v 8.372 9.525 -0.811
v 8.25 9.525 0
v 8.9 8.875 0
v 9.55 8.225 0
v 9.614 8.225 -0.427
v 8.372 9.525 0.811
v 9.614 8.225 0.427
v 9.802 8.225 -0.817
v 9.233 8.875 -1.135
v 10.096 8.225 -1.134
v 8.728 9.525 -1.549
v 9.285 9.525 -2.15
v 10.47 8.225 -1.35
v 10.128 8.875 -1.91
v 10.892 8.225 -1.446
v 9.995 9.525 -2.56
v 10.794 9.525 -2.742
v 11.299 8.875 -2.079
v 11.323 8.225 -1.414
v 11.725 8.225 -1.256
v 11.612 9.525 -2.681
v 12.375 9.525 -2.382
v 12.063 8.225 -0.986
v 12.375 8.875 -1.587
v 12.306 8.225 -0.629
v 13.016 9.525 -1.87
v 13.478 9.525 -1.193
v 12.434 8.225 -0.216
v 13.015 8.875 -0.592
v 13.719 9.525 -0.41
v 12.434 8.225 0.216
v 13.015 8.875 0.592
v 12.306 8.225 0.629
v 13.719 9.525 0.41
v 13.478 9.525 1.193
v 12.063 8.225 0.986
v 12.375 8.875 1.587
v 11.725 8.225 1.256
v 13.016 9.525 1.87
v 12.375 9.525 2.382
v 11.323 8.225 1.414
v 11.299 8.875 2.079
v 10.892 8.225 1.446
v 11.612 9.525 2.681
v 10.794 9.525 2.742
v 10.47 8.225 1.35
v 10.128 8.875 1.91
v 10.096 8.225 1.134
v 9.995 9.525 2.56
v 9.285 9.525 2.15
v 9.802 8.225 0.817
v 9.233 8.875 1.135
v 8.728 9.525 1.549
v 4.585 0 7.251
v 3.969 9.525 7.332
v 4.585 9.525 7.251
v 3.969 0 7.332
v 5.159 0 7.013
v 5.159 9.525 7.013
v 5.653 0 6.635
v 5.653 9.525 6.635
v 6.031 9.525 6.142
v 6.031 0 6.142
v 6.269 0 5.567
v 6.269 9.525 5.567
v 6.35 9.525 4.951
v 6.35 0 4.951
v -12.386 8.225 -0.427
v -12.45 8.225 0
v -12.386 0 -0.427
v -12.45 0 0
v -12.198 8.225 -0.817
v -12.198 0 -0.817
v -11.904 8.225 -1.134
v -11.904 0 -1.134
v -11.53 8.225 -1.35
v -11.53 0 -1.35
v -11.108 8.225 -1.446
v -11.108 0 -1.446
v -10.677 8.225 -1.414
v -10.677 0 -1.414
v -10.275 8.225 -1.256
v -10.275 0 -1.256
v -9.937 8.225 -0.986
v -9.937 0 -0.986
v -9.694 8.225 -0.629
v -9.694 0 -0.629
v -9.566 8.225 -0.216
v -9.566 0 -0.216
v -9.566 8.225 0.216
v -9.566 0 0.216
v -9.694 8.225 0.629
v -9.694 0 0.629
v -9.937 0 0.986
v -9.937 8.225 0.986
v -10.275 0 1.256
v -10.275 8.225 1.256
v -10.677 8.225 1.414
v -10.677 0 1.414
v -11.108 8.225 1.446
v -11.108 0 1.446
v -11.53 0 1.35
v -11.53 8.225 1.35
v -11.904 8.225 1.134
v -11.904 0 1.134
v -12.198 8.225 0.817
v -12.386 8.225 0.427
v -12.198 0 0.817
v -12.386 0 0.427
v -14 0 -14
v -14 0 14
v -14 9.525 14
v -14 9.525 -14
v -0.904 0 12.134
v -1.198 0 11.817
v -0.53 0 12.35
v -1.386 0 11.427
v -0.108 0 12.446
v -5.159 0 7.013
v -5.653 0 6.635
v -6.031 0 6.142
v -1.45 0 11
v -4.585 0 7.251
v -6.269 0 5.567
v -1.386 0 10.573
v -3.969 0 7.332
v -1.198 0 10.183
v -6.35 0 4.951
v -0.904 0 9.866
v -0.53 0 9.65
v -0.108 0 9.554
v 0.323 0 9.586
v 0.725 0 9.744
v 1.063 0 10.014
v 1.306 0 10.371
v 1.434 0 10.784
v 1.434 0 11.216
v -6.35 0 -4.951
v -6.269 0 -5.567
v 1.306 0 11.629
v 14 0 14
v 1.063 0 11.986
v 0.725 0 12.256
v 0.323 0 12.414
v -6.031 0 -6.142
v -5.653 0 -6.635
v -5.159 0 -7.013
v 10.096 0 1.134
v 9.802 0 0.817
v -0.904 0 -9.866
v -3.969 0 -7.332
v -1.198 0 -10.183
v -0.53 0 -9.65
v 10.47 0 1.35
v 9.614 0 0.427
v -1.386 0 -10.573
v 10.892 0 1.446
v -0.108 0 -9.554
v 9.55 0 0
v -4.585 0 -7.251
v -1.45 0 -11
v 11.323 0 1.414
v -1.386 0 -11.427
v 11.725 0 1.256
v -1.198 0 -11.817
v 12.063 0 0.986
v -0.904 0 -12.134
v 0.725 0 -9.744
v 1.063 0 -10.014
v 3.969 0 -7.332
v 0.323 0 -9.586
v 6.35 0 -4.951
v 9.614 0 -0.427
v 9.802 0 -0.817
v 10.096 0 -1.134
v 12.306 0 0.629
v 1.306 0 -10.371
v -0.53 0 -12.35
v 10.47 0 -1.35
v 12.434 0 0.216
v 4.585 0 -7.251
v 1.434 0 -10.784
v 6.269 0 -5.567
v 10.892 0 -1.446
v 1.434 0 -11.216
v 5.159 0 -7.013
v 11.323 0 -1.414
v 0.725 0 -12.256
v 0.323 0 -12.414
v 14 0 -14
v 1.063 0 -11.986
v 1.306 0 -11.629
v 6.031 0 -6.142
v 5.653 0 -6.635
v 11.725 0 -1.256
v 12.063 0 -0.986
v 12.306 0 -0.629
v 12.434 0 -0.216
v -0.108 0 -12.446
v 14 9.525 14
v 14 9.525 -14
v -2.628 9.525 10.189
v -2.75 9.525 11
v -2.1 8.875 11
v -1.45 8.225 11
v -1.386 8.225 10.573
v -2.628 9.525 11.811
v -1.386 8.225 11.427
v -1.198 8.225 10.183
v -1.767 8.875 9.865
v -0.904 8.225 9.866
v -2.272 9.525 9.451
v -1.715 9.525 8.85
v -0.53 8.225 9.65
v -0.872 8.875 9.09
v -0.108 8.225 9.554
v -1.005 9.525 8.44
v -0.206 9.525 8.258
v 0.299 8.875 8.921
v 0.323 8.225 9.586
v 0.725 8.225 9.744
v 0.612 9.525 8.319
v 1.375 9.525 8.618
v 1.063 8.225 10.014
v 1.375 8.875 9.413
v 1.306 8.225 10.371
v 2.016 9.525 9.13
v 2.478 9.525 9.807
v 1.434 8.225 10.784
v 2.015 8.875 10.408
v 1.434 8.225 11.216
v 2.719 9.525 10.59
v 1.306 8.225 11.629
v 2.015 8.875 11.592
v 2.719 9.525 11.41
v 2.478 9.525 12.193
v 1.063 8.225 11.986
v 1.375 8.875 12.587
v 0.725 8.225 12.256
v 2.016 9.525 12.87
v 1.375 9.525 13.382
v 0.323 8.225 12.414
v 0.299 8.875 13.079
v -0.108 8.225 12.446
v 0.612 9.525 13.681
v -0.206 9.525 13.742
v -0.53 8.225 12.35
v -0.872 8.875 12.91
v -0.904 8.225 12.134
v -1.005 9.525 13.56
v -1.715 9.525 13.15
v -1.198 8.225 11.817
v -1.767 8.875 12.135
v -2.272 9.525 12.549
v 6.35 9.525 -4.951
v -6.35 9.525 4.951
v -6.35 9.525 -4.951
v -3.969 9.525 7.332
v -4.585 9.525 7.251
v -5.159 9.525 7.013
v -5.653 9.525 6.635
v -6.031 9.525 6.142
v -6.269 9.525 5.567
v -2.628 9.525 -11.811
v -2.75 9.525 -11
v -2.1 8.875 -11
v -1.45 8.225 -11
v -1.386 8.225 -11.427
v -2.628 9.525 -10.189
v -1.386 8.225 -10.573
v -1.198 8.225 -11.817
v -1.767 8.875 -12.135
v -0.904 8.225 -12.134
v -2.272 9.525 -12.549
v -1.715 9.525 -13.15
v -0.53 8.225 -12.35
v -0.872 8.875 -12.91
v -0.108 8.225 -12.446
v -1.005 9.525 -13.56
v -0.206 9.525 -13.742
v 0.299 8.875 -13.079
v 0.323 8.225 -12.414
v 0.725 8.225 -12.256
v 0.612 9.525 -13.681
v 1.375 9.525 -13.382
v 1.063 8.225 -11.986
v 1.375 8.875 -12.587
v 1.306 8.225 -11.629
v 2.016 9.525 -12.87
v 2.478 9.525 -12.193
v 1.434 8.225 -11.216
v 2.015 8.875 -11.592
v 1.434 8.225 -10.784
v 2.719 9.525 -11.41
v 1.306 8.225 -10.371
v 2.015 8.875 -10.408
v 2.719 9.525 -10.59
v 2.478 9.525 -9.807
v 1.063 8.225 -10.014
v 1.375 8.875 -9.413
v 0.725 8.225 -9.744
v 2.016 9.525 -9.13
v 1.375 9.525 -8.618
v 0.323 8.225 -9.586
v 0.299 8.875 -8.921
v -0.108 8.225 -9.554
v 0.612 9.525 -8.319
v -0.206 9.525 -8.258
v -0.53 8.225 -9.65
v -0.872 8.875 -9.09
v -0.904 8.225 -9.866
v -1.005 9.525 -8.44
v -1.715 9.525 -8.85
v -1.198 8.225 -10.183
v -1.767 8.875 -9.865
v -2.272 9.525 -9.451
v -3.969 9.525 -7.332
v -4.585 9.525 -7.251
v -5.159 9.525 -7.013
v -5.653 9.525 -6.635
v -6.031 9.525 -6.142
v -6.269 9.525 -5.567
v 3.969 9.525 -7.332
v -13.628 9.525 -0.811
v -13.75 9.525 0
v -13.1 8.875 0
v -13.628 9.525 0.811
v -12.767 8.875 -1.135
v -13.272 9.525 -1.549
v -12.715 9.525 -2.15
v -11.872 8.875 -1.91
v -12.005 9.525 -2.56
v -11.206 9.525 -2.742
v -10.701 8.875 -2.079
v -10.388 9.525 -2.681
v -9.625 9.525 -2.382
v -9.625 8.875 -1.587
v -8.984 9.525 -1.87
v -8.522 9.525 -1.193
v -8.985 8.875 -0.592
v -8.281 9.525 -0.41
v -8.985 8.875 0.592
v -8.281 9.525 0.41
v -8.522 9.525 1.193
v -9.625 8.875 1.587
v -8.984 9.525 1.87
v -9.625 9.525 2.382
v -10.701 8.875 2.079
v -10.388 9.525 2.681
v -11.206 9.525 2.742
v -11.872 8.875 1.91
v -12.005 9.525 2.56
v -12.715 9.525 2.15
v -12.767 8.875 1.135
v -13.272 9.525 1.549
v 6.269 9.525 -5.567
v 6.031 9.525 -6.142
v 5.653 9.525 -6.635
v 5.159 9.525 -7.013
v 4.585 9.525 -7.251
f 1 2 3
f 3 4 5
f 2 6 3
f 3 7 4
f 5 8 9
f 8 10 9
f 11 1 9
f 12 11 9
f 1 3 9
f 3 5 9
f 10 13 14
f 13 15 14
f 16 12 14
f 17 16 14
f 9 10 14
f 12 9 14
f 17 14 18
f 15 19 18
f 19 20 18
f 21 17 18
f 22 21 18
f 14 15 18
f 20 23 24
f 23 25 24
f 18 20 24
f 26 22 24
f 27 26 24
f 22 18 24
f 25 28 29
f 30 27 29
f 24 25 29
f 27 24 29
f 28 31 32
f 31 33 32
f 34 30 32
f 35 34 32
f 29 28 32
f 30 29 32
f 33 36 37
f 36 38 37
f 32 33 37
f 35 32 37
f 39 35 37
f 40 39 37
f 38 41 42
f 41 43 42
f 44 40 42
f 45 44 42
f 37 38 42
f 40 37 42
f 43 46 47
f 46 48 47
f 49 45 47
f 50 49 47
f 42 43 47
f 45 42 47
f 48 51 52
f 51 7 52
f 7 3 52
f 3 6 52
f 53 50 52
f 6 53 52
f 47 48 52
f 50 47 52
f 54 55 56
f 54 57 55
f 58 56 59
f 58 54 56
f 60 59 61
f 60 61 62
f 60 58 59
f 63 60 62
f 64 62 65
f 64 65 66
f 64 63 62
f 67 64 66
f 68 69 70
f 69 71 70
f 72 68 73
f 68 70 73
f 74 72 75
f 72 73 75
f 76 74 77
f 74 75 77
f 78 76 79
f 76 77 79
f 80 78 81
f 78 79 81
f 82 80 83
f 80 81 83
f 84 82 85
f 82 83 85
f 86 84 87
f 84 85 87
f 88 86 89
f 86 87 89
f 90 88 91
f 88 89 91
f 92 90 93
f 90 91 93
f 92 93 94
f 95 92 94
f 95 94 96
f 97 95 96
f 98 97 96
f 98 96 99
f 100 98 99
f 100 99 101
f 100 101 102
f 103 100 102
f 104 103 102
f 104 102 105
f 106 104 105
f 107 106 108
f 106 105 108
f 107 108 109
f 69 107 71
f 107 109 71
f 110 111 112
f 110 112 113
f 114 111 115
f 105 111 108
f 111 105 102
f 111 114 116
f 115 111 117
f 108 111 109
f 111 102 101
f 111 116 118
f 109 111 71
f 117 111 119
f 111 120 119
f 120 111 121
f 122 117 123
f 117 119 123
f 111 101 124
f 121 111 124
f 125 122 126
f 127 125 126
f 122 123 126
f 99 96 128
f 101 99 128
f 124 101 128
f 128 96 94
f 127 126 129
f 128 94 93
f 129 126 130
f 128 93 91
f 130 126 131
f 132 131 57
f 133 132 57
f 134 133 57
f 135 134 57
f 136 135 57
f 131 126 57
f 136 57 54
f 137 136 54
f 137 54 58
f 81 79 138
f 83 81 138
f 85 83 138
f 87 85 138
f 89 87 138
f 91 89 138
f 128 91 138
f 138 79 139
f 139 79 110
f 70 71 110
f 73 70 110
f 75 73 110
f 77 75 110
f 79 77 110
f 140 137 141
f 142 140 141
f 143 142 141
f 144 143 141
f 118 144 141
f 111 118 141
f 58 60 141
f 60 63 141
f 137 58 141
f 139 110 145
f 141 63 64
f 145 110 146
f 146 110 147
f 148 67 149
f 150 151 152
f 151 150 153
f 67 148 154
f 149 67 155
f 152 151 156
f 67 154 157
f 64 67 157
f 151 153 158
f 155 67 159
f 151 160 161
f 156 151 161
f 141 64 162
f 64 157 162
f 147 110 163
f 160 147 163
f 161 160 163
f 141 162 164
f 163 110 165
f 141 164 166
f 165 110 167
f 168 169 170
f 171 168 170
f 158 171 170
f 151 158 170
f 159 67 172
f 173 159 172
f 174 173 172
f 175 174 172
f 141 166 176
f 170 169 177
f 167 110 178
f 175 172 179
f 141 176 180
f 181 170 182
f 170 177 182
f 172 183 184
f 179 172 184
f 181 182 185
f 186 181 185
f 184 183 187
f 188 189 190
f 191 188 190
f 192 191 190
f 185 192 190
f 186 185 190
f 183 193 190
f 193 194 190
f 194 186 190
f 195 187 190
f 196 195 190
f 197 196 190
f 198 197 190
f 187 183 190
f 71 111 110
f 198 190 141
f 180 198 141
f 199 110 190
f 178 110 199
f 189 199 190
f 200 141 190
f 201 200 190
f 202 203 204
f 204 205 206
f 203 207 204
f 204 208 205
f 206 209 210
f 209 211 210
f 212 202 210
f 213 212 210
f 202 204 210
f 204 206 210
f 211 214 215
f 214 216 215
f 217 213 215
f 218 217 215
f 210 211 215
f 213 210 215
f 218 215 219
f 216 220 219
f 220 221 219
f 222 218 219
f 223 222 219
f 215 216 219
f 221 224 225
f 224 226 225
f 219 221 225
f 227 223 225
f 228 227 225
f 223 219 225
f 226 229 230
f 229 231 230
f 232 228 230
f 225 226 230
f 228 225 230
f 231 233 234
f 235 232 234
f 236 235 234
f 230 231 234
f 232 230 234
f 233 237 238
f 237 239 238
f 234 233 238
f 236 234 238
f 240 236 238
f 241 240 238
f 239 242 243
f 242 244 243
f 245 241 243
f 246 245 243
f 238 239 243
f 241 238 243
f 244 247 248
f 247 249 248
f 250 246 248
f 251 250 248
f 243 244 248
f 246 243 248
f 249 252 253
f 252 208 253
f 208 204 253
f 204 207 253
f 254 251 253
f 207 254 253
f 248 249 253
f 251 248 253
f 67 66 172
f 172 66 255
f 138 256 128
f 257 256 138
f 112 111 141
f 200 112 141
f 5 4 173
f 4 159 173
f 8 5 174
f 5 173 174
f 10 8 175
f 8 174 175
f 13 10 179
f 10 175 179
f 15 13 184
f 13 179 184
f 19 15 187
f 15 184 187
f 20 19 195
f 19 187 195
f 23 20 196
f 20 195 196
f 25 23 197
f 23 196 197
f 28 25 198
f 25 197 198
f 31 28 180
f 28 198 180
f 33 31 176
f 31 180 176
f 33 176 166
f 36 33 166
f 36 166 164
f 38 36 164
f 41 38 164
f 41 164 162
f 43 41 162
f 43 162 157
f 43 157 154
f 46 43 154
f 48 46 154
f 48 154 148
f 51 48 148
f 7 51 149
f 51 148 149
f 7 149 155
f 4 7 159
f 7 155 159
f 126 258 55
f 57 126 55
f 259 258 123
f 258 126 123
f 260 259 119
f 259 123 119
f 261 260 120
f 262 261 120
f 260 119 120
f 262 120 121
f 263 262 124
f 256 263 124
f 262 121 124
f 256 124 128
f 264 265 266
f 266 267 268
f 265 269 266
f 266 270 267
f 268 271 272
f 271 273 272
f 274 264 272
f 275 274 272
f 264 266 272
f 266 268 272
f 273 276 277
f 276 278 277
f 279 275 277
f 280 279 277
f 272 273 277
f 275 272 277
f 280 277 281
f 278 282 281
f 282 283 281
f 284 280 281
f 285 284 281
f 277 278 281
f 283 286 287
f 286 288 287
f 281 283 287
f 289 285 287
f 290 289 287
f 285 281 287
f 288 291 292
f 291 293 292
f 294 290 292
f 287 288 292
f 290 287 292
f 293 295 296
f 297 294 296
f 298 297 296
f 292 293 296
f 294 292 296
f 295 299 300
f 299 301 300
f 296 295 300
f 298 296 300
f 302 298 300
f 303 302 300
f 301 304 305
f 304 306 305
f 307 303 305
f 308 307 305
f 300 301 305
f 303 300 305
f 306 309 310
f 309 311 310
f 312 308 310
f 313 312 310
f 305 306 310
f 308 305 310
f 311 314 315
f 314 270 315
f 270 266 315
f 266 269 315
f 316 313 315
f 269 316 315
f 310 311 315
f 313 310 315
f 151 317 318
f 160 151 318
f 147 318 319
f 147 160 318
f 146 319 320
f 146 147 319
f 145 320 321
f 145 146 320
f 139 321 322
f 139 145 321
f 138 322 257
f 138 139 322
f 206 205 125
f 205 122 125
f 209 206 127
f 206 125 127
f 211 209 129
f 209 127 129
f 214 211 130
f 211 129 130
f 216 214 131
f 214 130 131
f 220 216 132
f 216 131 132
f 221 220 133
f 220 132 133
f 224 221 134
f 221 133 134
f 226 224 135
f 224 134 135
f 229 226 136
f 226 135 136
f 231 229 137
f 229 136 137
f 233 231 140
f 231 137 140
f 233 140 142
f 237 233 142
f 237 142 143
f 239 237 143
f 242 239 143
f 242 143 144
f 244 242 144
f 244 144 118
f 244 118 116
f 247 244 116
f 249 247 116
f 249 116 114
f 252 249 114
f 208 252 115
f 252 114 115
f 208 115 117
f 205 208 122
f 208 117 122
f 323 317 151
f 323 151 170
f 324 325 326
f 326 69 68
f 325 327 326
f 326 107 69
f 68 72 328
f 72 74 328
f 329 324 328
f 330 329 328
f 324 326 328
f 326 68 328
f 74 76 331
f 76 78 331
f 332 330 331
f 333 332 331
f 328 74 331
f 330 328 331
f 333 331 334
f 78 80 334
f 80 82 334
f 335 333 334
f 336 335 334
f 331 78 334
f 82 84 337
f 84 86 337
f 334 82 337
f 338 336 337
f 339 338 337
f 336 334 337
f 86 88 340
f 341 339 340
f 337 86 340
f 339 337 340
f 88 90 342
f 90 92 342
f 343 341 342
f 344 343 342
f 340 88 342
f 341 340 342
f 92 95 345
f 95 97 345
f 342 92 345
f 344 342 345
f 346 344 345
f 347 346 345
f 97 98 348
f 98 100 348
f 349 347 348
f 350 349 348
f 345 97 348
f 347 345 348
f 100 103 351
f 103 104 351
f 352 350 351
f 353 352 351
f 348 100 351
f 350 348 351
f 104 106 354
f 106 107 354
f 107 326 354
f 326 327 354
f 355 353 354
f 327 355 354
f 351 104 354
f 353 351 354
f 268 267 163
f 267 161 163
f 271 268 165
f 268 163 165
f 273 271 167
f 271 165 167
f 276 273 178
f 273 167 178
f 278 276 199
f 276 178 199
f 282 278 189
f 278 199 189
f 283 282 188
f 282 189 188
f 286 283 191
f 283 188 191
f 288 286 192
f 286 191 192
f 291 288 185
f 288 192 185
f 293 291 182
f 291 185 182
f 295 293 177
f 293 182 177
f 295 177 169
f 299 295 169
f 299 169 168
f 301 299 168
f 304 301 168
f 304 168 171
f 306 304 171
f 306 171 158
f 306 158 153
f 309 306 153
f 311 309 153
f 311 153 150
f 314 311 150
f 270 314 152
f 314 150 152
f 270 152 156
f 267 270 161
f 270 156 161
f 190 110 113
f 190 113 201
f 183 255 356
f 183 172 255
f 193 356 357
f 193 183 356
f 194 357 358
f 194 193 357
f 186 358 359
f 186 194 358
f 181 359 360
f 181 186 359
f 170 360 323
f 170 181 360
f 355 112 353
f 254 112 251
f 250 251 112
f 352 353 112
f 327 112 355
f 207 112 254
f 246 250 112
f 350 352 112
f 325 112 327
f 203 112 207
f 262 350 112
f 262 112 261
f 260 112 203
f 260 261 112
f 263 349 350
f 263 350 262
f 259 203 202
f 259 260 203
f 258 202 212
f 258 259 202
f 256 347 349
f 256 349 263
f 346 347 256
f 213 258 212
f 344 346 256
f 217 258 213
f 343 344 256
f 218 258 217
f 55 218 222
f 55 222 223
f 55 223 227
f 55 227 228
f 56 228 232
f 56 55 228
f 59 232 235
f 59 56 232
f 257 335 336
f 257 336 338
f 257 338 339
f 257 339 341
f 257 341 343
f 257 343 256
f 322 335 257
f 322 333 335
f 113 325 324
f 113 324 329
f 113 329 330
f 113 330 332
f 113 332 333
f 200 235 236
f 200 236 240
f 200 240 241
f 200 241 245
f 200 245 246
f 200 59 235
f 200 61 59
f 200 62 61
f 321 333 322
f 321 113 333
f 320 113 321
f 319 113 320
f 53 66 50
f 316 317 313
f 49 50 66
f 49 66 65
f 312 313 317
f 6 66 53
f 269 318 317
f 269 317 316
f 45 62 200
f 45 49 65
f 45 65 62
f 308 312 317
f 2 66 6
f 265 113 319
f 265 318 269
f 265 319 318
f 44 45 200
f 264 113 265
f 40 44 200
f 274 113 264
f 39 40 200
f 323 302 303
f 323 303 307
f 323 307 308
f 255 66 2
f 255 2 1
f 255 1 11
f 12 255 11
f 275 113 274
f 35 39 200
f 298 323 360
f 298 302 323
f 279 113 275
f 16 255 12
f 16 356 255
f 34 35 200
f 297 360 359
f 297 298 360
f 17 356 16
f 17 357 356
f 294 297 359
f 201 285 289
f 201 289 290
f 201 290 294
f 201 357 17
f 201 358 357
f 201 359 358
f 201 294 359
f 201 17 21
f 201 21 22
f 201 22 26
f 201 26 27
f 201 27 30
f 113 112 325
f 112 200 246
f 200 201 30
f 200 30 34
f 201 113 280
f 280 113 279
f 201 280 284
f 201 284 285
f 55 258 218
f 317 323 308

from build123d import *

# Parameters (mm, degrees)
SKETCH2_W                                         = 28
SKETCH2_H                                         = 28
BOSS_EXTRUDE1_DEPTH                               = 9.525
SKETCH6_W                                         = 12.7
SKETCH6_H                                         = 14.66469
CUT_EXTRUDE3_DEPTH                                = 9.525
FILLET1_R                                         = 2.38125
CSK_FOR_M2_5_FLAT_HEAD_MACHINE_SCREW1_D           = 2.9
CSK_FOR_M2_5_FLAT_HEAD_MACHINE_SCREW1_DEPTH       = 10.16
CSK_FOR_M2_5_FLAT_HEAD_MACHINE_SCREW1_CSINK_D     = 5.5
CSK_FOR_M2_5_FLAT_HEAD_MACHINE_SCREW1_CSINK_ANGLE = 90
CSK_FOR_M2_5_FLAT_HEAD_MACHINE_SCREW1_TIP         = 0.871247898


with BuildPart() as part:
    # Sketch2 → Boss-Extrude1 (new body)
    with BuildSketch(Plane(origin=(0, 0, 0), x_dir=(1, 0, 0), z_dir=(0, 1, 0))):
        Rectangle(SKETCH2_W, SKETCH2_H)
    extrude(amount=BOSS_EXTRUDE1_DEPTH)

    # Sketch6 → Cut-Extrude3 (cut)
    with BuildSketch(Plane(origin=(0, 9.525, 0), x_dir=(1, 0, 0), z_dir=(0, 1, 0))):
        Rectangle(SKETCH6_W, SKETCH6_H)
    extrude(amount=-CUT_EXTRUDE3_DEPTH, mode=Mode.SUBTRACT)

    # Fillet1
    fillet1_edges = [part.edges().sort_by_distance(p)[0] for p in [
        (-6.35, 4.7625, 7.332345),
        (-6.35, 4.7625, -7.332345),
        (6.35, 4.7625, -7.332345),
        (6.35, 4.7625, 7.332345),
    ]]
    fillet(fillet1_edges, radius=FILLET1_R)

    # CSK for M2.5 Flat Head Machine Screw1
    with Locations(Plane(origin=(0, 9.525, 0), x_dir=(1, 0, 0), z_dir=(0, 1, 0))):
        with Locations((-11, 0), (0, -11), (11, 0), (0, 11)):
            CounterSinkHole(CSK_FOR_M2_5_FLAT_HEAD_MACHINE_SCREW1_D / 2, CSK_FOR_M2_5_FLAT_HEAD_MACHINE_SCREW1_CSINK_D / 2, depth=CSK_FOR_M2_5_FLAT_HEAD_MACHINE_SCREW1_DEPTH, counter_sink_angle=CSK_FOR_M2_5_FLAT_HEAD_MACHINE_SCREW1_CSINK_ANGLE)
            with Locations((0, 0, -(CSK_FOR_M2_5_FLAT_HEAD_MACHINE_SCREW1_DEPTH + CSK_FOR_M2_5_FLAT_HEAD_MACHINE_SCREW1_TIP / 2))):  # 118° drill point
                Cone(0, CSK_FOR_M2_5_FLAT_HEAD_MACHINE_SCREW1_D / 2, CSK_FOR_M2_5_FLAT_HEAD_MACHINE_SCREW1_TIP, mode=Mode.SUBTRACT)


solid = part.part
